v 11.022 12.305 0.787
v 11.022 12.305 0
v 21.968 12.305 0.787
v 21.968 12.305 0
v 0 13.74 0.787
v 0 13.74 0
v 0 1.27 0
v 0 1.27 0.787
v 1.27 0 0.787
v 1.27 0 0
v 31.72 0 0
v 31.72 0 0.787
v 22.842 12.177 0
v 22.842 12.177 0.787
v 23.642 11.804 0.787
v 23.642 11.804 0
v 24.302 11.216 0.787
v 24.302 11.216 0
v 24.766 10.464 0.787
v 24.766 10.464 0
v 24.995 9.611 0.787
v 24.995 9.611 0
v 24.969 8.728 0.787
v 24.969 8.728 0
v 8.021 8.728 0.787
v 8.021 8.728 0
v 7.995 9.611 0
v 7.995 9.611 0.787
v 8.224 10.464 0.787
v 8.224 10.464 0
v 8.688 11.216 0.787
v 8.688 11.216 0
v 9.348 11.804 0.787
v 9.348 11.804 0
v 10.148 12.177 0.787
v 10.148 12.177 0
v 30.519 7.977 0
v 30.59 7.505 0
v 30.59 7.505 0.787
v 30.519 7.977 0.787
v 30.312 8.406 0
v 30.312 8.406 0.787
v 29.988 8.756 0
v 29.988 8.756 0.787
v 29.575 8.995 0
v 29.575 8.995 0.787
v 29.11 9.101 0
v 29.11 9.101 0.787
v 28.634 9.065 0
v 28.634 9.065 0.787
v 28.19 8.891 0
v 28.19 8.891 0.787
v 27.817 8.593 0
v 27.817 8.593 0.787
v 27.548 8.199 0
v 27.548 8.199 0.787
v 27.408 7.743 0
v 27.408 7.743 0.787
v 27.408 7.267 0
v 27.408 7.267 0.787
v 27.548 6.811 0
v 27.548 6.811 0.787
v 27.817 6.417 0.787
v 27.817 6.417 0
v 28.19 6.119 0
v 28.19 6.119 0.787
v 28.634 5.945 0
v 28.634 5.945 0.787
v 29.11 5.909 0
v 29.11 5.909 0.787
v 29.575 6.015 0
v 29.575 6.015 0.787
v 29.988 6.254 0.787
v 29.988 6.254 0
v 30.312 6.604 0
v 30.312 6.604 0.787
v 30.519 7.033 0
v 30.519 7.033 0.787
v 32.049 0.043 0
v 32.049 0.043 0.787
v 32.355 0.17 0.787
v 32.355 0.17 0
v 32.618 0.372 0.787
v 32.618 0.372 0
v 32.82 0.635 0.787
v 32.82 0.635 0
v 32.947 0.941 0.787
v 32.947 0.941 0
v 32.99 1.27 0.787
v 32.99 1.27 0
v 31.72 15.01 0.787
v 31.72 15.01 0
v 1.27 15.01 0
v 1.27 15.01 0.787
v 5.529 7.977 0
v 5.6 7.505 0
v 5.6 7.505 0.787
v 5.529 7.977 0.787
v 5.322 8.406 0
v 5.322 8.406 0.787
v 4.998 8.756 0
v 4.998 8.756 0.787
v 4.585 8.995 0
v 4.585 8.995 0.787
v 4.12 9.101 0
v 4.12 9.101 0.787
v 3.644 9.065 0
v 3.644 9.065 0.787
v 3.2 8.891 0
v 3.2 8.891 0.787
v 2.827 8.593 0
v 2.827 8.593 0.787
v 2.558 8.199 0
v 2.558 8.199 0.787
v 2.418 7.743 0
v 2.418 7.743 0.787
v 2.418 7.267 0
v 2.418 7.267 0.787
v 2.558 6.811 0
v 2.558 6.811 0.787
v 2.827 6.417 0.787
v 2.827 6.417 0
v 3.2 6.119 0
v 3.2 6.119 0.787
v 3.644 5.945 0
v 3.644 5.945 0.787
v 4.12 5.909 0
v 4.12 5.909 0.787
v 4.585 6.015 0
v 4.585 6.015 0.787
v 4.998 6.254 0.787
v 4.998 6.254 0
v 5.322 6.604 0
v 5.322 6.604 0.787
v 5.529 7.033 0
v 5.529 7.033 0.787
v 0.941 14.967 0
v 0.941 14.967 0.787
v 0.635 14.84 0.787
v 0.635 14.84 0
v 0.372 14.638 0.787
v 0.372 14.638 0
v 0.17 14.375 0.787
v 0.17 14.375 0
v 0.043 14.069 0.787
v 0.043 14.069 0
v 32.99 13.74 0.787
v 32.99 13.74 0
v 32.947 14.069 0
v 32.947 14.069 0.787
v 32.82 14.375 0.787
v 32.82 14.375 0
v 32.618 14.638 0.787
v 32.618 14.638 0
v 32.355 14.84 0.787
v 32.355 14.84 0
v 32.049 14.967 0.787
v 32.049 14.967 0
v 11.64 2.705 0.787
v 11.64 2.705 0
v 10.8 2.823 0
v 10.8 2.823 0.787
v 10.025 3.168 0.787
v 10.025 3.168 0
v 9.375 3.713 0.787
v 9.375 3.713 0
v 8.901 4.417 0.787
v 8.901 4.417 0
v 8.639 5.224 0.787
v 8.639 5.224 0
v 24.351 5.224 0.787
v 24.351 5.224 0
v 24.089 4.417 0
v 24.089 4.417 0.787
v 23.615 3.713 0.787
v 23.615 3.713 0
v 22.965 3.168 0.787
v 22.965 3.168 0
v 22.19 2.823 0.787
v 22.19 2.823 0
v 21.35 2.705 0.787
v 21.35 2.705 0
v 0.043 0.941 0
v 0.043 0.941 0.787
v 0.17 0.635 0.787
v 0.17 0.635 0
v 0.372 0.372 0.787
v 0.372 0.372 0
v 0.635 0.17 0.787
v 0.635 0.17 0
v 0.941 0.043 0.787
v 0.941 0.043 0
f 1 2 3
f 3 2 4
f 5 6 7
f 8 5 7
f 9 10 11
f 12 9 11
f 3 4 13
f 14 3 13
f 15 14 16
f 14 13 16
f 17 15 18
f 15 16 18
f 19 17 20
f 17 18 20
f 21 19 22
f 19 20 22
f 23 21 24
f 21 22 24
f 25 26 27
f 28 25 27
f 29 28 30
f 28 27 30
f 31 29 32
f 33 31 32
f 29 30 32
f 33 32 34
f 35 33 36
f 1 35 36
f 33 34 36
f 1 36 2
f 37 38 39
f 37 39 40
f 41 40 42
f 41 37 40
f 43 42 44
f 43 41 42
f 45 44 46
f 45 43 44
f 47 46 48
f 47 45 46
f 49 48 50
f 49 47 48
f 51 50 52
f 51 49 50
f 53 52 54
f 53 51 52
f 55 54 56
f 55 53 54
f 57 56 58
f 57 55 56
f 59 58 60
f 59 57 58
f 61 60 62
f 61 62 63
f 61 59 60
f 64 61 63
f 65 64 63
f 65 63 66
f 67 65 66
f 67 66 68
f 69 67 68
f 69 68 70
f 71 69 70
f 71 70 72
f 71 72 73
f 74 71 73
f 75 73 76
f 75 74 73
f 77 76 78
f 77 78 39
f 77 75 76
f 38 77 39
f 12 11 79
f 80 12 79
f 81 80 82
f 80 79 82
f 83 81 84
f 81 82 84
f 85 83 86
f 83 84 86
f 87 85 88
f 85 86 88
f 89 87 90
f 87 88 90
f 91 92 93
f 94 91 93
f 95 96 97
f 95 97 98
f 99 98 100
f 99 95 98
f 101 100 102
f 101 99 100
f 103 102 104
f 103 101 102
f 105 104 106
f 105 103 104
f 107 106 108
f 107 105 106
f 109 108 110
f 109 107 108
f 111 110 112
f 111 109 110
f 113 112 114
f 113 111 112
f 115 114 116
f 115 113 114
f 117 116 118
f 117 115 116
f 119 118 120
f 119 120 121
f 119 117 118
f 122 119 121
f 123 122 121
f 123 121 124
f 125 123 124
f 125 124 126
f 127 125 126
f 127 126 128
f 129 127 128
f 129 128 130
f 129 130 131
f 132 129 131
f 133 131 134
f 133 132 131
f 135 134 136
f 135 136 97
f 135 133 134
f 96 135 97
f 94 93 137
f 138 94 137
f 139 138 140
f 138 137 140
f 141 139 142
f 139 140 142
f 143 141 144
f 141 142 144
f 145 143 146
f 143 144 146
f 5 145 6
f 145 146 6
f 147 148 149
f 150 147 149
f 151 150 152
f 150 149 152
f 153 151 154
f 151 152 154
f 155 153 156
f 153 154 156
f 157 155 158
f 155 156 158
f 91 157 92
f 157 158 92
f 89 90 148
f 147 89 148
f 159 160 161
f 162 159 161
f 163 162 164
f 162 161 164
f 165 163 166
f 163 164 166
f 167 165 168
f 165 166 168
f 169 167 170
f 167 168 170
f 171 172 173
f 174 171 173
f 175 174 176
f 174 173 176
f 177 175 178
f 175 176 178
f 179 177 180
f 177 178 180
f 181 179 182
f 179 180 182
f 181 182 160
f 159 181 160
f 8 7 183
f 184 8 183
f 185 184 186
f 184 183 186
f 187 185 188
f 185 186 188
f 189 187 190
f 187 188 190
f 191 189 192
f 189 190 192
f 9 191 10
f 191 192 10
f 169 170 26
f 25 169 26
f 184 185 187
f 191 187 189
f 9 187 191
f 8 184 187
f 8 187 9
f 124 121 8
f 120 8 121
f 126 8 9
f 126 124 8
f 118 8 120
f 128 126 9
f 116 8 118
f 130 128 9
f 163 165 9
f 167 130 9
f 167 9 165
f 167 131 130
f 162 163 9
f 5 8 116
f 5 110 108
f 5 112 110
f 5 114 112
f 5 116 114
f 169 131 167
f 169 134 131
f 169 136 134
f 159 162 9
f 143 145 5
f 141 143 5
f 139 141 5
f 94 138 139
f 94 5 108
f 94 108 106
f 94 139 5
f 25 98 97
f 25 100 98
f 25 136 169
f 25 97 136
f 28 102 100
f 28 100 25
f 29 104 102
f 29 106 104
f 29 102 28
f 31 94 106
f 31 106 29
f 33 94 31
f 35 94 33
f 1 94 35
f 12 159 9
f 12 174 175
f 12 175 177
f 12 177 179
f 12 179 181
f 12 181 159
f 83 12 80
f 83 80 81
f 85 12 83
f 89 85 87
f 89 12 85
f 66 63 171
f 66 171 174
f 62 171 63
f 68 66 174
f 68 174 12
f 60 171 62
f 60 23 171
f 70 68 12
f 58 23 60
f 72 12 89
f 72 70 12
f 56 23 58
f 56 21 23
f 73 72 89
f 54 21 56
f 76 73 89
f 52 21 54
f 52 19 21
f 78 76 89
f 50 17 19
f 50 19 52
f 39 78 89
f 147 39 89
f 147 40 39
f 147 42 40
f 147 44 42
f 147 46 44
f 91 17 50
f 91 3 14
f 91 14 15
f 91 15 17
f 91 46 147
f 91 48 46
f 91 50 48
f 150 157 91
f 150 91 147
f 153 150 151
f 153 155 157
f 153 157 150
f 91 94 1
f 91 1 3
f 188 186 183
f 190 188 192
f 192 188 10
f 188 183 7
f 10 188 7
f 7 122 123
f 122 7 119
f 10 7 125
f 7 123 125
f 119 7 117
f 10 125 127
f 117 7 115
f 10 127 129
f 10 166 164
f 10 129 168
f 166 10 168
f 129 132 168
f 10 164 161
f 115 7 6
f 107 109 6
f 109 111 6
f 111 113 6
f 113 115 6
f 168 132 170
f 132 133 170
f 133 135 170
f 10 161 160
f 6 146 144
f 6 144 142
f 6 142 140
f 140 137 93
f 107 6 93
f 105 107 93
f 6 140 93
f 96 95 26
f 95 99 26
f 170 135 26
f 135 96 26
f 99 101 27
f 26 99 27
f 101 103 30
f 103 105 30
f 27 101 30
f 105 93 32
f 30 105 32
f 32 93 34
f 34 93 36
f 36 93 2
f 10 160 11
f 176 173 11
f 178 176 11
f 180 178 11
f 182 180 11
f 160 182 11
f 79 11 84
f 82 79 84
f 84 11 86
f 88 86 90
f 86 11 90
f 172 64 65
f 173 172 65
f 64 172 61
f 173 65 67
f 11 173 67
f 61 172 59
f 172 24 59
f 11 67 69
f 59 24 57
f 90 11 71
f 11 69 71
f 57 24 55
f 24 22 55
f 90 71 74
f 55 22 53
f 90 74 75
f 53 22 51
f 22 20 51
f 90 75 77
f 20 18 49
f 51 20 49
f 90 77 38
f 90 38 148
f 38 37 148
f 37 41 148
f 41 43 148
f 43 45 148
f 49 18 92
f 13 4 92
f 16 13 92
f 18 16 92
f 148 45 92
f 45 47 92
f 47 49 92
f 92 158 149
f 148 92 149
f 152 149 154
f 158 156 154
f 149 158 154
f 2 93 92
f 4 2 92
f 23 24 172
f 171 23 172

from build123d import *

# Parameters (mm, degrees)
SKETCH1_R           = 1.6002
BOSS_EXTRUDE1_DEPTH = 0.7874


with BuildPart() as part:
    # Sketch1 → Boss-Extrude1 (new body)
    with BuildSketch(Plane.XY):
        with BuildLine():
            Line((1.27, 0), (31.72, 0))
            ThreePointArc((31.72, 0), (32.618025612, 0.371974388), (32.99, 1.27))
            Line((32.99, 1.27), (32.99, 13.74))
            ThreePointArc((32.99, 13.74), (32.618025612, 14.638025612), (31.72, 15.01))
            Line((31.72, 15.01), (1.27, 15.01))
            ThreePointArc((1.27, 15.01), (0.371974388, 14.638025612), (0, 13.74))
            Line((0, 13.74), (0, 1.27))
            ThreePointArc((0, 1.27), (0.371974388, 0.371974388), (1.27, 0))
        make_face()
        with Locations((4, 7.505)):
            Circle(SKETCH1_R, mode=Mode.SUBTRACT)
        with Locations((28.99, 7.505)):
            Circle(SKETCH1_R, mode=Mode.SUBTRACT)
        with BuildLine():
            Line((11.02246495, 12.305), (21.96753505, 12.305))
            ThreePointArc((21.96753505, 12.305), (24.302438512, 11.216216634), (24.969229081, 8.727720354))
            Line((24.969229081, 8.727720354), (24.351379341, 5.223720354))
            ThreePointArc((24.351379341, 5.223720354), (23.308901944, 3.418096537), (21.349685309, 2.705))
            Line((21.349685309, 2.705), (11.640314691, 2.705))
            ThreePointArc((11.640314691, 2.705), (9.681098056, 3.418096537), (8.638620659, 5.223720354))
            Line((8.638620659, 5.223720354), (8.020770919, 8.727720354))
            ThreePointArc((8.020770919, 8.727720354), (8.687561488, 11.216216634), (11.02246495, 12.305))
        make_face(mode=Mode.SUBTRACT)
    extrude(amount=BOSS_EXTRUDE1_DEPTH)


solid = part.part
